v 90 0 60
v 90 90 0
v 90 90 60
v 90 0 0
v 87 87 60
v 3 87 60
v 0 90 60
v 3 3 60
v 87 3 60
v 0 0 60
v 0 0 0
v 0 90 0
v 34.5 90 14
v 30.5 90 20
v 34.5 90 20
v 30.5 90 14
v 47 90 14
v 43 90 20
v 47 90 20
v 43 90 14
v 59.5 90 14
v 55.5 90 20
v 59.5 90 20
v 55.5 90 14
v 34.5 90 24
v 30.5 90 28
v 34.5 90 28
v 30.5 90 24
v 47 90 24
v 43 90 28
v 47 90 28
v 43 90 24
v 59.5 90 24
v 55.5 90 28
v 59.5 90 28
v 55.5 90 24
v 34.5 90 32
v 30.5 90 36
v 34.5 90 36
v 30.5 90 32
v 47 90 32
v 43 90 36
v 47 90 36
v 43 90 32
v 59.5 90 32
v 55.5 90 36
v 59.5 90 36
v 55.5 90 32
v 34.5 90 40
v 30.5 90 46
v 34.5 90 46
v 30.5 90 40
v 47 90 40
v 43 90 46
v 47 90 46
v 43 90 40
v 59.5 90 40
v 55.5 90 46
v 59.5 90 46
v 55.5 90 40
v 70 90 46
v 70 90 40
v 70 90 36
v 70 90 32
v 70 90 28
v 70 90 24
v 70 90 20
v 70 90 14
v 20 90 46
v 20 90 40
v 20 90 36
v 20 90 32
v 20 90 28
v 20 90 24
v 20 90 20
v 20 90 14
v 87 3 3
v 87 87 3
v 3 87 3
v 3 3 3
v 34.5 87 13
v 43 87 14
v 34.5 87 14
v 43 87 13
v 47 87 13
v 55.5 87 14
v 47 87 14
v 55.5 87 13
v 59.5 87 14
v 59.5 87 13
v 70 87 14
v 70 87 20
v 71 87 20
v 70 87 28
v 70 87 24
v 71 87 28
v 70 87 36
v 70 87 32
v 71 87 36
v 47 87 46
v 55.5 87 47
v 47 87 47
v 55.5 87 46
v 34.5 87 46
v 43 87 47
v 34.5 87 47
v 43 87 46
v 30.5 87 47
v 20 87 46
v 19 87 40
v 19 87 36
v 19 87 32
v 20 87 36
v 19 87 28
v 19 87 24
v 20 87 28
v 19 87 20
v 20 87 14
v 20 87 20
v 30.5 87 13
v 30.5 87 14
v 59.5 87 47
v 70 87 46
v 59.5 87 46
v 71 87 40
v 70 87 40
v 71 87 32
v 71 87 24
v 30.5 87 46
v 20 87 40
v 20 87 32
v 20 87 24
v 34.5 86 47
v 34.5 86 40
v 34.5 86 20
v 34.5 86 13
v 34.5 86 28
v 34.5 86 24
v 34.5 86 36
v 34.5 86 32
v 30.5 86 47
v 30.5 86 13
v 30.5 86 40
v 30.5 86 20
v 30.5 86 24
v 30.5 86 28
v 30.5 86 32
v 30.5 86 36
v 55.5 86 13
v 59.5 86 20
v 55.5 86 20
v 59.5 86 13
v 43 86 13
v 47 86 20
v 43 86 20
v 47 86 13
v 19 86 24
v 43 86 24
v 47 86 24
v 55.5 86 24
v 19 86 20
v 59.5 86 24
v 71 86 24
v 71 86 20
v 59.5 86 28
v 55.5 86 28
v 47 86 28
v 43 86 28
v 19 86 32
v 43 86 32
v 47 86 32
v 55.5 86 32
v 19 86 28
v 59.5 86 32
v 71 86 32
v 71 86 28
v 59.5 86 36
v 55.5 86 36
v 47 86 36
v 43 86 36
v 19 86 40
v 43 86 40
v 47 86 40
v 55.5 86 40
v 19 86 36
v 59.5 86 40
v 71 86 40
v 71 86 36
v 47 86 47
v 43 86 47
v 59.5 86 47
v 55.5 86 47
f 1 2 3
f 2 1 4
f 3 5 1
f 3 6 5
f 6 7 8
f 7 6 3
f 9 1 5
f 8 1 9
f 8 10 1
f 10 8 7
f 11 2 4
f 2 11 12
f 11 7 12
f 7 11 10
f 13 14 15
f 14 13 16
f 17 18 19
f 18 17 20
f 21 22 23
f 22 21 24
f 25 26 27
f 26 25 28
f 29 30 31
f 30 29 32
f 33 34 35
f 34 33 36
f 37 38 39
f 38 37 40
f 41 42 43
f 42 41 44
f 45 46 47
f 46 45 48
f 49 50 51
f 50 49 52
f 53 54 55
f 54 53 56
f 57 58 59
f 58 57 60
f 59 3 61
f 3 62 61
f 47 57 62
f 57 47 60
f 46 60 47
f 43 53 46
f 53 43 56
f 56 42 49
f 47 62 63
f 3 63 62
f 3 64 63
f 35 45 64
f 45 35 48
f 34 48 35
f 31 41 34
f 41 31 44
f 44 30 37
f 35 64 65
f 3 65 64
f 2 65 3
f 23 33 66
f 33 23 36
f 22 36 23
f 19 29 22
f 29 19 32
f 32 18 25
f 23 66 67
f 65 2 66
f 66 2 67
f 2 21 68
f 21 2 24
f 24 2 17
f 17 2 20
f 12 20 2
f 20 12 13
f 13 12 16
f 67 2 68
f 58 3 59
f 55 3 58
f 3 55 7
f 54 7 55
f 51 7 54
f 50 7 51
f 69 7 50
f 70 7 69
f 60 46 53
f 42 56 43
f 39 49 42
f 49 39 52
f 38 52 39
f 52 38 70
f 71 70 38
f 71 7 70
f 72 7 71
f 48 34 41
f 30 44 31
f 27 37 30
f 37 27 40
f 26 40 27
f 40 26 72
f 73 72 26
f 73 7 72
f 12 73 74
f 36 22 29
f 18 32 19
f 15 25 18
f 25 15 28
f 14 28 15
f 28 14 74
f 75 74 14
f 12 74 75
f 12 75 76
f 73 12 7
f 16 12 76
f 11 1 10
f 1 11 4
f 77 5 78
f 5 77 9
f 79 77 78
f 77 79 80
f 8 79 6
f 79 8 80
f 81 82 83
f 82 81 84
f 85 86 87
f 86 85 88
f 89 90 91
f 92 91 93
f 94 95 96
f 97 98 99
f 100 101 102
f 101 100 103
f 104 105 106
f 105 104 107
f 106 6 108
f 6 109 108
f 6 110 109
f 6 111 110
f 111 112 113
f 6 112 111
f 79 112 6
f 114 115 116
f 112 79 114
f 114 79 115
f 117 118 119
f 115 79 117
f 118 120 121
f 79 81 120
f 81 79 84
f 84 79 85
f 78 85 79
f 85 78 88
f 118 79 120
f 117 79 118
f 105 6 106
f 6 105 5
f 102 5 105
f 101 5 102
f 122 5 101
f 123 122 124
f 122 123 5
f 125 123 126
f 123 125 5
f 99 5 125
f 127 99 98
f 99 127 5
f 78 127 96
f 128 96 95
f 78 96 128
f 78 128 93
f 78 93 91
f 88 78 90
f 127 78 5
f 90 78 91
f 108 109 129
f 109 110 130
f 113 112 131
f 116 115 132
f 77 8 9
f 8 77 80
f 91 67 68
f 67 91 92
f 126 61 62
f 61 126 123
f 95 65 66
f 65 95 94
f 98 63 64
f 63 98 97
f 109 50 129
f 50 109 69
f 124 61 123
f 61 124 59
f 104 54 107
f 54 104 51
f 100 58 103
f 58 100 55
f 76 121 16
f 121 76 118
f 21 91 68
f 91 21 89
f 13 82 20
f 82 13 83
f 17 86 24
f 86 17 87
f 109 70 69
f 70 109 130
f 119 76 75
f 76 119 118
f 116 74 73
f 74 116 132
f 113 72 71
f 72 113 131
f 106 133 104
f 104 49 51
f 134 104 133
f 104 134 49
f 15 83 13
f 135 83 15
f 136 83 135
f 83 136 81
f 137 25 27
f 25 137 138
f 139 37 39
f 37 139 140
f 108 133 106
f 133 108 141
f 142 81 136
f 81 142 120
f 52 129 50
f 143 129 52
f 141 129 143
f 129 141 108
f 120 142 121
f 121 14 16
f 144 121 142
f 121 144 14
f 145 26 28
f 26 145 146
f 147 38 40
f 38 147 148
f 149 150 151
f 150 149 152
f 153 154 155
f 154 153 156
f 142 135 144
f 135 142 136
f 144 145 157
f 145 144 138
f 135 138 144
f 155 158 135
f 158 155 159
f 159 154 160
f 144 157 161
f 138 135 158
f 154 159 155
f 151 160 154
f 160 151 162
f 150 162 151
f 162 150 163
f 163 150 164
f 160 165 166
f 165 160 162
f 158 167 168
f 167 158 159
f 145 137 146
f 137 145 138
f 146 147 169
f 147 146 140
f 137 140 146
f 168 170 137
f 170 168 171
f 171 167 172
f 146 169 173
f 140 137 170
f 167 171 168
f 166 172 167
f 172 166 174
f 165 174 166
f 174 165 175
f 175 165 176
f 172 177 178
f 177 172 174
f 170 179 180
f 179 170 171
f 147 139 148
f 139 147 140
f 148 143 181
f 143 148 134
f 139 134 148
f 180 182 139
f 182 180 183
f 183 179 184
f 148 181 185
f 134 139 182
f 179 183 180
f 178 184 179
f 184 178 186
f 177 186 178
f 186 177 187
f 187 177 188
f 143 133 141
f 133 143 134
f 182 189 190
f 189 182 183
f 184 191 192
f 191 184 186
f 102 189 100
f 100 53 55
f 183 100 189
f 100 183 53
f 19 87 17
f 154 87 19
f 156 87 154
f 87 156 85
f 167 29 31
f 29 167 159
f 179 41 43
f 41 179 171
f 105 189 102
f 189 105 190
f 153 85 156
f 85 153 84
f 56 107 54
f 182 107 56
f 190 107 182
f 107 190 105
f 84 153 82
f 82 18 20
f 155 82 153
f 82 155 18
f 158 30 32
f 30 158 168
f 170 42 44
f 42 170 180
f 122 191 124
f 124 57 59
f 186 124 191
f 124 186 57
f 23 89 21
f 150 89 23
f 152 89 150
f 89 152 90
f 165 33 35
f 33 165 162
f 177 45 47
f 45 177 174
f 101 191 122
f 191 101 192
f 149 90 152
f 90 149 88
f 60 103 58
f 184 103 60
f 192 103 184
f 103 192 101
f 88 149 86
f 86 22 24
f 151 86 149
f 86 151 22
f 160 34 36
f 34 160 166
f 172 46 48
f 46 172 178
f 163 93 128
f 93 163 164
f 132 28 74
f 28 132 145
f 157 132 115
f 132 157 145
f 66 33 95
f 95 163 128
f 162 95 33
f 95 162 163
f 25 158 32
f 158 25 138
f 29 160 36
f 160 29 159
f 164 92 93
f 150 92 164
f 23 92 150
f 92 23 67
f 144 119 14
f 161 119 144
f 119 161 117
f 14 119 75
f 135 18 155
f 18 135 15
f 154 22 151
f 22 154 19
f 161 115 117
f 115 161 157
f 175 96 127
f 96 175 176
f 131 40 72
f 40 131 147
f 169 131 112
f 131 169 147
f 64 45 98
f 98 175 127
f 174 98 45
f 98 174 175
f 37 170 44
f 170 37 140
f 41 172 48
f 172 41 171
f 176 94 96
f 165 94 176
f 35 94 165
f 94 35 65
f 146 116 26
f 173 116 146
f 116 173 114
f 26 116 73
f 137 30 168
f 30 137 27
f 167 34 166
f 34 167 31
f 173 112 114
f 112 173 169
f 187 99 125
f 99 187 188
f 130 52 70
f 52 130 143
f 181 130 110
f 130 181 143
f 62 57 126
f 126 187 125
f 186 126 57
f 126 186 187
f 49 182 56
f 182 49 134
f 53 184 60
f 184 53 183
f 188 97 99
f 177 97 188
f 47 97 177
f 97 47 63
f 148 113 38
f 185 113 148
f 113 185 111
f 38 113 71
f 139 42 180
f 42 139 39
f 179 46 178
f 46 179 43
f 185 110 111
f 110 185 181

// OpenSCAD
$fn = 32;

// ----------------------------------------------------------------------
// Vent box: crossgrid enclosure
// ----------------------------------------------------------------------

// --- parameters (mm) ---
box_l = 90;               // box length, X
box_w = 90;               // box width, Y
box_h = 60;               // box height, Z
wall_t = 3;               // shell wall thickness
win_l = 50;               // vent window width, X
win_h = 32;               // vent window height, Z
bar_w = 4;                // grid bar width
n_v = 3;                  // vertical bar count
n_h = 3;                  // horizontal bar count

win_z0 = (box_h - win_h) / 2;  // window lower edge Z
v_step = win_l / (n_v + 1);  // vertical bar step
h_step = win_h / (n_h + 1);  // horizontal bar step

difference() {
  union() {
    difference() {
      cube([box_l, box_w, box_h]);
  translate([wall_t, wall_t, wall_t])
    cube([box_l - 2 * wall_t, box_w - 2 * wall_t, box_h]);
  translate([(box_l - win_l) / 2, box_w - wall_t - 1, win_z0])
    cube([win_l, wall_t + 2, win_h]);
    }
    for (i = [1 : n_v])
      translate([(box_l - win_l) / 2 + i * v_step - bar_w / 2,
                 box_w - wall_t - 1, win_z0 - 1])
        cube([bar_w, wall_t + 1, win_h + 2]);
    for (i = [1 : n_h])
      translate([(box_l - win_l) / 2 - 1, box_w - wall_t - 1,
                 win_z0 + i * h_step - bar_w / 2])
        cube([win_l + 2, wall_t + 1, bar_w]);
  }
}
